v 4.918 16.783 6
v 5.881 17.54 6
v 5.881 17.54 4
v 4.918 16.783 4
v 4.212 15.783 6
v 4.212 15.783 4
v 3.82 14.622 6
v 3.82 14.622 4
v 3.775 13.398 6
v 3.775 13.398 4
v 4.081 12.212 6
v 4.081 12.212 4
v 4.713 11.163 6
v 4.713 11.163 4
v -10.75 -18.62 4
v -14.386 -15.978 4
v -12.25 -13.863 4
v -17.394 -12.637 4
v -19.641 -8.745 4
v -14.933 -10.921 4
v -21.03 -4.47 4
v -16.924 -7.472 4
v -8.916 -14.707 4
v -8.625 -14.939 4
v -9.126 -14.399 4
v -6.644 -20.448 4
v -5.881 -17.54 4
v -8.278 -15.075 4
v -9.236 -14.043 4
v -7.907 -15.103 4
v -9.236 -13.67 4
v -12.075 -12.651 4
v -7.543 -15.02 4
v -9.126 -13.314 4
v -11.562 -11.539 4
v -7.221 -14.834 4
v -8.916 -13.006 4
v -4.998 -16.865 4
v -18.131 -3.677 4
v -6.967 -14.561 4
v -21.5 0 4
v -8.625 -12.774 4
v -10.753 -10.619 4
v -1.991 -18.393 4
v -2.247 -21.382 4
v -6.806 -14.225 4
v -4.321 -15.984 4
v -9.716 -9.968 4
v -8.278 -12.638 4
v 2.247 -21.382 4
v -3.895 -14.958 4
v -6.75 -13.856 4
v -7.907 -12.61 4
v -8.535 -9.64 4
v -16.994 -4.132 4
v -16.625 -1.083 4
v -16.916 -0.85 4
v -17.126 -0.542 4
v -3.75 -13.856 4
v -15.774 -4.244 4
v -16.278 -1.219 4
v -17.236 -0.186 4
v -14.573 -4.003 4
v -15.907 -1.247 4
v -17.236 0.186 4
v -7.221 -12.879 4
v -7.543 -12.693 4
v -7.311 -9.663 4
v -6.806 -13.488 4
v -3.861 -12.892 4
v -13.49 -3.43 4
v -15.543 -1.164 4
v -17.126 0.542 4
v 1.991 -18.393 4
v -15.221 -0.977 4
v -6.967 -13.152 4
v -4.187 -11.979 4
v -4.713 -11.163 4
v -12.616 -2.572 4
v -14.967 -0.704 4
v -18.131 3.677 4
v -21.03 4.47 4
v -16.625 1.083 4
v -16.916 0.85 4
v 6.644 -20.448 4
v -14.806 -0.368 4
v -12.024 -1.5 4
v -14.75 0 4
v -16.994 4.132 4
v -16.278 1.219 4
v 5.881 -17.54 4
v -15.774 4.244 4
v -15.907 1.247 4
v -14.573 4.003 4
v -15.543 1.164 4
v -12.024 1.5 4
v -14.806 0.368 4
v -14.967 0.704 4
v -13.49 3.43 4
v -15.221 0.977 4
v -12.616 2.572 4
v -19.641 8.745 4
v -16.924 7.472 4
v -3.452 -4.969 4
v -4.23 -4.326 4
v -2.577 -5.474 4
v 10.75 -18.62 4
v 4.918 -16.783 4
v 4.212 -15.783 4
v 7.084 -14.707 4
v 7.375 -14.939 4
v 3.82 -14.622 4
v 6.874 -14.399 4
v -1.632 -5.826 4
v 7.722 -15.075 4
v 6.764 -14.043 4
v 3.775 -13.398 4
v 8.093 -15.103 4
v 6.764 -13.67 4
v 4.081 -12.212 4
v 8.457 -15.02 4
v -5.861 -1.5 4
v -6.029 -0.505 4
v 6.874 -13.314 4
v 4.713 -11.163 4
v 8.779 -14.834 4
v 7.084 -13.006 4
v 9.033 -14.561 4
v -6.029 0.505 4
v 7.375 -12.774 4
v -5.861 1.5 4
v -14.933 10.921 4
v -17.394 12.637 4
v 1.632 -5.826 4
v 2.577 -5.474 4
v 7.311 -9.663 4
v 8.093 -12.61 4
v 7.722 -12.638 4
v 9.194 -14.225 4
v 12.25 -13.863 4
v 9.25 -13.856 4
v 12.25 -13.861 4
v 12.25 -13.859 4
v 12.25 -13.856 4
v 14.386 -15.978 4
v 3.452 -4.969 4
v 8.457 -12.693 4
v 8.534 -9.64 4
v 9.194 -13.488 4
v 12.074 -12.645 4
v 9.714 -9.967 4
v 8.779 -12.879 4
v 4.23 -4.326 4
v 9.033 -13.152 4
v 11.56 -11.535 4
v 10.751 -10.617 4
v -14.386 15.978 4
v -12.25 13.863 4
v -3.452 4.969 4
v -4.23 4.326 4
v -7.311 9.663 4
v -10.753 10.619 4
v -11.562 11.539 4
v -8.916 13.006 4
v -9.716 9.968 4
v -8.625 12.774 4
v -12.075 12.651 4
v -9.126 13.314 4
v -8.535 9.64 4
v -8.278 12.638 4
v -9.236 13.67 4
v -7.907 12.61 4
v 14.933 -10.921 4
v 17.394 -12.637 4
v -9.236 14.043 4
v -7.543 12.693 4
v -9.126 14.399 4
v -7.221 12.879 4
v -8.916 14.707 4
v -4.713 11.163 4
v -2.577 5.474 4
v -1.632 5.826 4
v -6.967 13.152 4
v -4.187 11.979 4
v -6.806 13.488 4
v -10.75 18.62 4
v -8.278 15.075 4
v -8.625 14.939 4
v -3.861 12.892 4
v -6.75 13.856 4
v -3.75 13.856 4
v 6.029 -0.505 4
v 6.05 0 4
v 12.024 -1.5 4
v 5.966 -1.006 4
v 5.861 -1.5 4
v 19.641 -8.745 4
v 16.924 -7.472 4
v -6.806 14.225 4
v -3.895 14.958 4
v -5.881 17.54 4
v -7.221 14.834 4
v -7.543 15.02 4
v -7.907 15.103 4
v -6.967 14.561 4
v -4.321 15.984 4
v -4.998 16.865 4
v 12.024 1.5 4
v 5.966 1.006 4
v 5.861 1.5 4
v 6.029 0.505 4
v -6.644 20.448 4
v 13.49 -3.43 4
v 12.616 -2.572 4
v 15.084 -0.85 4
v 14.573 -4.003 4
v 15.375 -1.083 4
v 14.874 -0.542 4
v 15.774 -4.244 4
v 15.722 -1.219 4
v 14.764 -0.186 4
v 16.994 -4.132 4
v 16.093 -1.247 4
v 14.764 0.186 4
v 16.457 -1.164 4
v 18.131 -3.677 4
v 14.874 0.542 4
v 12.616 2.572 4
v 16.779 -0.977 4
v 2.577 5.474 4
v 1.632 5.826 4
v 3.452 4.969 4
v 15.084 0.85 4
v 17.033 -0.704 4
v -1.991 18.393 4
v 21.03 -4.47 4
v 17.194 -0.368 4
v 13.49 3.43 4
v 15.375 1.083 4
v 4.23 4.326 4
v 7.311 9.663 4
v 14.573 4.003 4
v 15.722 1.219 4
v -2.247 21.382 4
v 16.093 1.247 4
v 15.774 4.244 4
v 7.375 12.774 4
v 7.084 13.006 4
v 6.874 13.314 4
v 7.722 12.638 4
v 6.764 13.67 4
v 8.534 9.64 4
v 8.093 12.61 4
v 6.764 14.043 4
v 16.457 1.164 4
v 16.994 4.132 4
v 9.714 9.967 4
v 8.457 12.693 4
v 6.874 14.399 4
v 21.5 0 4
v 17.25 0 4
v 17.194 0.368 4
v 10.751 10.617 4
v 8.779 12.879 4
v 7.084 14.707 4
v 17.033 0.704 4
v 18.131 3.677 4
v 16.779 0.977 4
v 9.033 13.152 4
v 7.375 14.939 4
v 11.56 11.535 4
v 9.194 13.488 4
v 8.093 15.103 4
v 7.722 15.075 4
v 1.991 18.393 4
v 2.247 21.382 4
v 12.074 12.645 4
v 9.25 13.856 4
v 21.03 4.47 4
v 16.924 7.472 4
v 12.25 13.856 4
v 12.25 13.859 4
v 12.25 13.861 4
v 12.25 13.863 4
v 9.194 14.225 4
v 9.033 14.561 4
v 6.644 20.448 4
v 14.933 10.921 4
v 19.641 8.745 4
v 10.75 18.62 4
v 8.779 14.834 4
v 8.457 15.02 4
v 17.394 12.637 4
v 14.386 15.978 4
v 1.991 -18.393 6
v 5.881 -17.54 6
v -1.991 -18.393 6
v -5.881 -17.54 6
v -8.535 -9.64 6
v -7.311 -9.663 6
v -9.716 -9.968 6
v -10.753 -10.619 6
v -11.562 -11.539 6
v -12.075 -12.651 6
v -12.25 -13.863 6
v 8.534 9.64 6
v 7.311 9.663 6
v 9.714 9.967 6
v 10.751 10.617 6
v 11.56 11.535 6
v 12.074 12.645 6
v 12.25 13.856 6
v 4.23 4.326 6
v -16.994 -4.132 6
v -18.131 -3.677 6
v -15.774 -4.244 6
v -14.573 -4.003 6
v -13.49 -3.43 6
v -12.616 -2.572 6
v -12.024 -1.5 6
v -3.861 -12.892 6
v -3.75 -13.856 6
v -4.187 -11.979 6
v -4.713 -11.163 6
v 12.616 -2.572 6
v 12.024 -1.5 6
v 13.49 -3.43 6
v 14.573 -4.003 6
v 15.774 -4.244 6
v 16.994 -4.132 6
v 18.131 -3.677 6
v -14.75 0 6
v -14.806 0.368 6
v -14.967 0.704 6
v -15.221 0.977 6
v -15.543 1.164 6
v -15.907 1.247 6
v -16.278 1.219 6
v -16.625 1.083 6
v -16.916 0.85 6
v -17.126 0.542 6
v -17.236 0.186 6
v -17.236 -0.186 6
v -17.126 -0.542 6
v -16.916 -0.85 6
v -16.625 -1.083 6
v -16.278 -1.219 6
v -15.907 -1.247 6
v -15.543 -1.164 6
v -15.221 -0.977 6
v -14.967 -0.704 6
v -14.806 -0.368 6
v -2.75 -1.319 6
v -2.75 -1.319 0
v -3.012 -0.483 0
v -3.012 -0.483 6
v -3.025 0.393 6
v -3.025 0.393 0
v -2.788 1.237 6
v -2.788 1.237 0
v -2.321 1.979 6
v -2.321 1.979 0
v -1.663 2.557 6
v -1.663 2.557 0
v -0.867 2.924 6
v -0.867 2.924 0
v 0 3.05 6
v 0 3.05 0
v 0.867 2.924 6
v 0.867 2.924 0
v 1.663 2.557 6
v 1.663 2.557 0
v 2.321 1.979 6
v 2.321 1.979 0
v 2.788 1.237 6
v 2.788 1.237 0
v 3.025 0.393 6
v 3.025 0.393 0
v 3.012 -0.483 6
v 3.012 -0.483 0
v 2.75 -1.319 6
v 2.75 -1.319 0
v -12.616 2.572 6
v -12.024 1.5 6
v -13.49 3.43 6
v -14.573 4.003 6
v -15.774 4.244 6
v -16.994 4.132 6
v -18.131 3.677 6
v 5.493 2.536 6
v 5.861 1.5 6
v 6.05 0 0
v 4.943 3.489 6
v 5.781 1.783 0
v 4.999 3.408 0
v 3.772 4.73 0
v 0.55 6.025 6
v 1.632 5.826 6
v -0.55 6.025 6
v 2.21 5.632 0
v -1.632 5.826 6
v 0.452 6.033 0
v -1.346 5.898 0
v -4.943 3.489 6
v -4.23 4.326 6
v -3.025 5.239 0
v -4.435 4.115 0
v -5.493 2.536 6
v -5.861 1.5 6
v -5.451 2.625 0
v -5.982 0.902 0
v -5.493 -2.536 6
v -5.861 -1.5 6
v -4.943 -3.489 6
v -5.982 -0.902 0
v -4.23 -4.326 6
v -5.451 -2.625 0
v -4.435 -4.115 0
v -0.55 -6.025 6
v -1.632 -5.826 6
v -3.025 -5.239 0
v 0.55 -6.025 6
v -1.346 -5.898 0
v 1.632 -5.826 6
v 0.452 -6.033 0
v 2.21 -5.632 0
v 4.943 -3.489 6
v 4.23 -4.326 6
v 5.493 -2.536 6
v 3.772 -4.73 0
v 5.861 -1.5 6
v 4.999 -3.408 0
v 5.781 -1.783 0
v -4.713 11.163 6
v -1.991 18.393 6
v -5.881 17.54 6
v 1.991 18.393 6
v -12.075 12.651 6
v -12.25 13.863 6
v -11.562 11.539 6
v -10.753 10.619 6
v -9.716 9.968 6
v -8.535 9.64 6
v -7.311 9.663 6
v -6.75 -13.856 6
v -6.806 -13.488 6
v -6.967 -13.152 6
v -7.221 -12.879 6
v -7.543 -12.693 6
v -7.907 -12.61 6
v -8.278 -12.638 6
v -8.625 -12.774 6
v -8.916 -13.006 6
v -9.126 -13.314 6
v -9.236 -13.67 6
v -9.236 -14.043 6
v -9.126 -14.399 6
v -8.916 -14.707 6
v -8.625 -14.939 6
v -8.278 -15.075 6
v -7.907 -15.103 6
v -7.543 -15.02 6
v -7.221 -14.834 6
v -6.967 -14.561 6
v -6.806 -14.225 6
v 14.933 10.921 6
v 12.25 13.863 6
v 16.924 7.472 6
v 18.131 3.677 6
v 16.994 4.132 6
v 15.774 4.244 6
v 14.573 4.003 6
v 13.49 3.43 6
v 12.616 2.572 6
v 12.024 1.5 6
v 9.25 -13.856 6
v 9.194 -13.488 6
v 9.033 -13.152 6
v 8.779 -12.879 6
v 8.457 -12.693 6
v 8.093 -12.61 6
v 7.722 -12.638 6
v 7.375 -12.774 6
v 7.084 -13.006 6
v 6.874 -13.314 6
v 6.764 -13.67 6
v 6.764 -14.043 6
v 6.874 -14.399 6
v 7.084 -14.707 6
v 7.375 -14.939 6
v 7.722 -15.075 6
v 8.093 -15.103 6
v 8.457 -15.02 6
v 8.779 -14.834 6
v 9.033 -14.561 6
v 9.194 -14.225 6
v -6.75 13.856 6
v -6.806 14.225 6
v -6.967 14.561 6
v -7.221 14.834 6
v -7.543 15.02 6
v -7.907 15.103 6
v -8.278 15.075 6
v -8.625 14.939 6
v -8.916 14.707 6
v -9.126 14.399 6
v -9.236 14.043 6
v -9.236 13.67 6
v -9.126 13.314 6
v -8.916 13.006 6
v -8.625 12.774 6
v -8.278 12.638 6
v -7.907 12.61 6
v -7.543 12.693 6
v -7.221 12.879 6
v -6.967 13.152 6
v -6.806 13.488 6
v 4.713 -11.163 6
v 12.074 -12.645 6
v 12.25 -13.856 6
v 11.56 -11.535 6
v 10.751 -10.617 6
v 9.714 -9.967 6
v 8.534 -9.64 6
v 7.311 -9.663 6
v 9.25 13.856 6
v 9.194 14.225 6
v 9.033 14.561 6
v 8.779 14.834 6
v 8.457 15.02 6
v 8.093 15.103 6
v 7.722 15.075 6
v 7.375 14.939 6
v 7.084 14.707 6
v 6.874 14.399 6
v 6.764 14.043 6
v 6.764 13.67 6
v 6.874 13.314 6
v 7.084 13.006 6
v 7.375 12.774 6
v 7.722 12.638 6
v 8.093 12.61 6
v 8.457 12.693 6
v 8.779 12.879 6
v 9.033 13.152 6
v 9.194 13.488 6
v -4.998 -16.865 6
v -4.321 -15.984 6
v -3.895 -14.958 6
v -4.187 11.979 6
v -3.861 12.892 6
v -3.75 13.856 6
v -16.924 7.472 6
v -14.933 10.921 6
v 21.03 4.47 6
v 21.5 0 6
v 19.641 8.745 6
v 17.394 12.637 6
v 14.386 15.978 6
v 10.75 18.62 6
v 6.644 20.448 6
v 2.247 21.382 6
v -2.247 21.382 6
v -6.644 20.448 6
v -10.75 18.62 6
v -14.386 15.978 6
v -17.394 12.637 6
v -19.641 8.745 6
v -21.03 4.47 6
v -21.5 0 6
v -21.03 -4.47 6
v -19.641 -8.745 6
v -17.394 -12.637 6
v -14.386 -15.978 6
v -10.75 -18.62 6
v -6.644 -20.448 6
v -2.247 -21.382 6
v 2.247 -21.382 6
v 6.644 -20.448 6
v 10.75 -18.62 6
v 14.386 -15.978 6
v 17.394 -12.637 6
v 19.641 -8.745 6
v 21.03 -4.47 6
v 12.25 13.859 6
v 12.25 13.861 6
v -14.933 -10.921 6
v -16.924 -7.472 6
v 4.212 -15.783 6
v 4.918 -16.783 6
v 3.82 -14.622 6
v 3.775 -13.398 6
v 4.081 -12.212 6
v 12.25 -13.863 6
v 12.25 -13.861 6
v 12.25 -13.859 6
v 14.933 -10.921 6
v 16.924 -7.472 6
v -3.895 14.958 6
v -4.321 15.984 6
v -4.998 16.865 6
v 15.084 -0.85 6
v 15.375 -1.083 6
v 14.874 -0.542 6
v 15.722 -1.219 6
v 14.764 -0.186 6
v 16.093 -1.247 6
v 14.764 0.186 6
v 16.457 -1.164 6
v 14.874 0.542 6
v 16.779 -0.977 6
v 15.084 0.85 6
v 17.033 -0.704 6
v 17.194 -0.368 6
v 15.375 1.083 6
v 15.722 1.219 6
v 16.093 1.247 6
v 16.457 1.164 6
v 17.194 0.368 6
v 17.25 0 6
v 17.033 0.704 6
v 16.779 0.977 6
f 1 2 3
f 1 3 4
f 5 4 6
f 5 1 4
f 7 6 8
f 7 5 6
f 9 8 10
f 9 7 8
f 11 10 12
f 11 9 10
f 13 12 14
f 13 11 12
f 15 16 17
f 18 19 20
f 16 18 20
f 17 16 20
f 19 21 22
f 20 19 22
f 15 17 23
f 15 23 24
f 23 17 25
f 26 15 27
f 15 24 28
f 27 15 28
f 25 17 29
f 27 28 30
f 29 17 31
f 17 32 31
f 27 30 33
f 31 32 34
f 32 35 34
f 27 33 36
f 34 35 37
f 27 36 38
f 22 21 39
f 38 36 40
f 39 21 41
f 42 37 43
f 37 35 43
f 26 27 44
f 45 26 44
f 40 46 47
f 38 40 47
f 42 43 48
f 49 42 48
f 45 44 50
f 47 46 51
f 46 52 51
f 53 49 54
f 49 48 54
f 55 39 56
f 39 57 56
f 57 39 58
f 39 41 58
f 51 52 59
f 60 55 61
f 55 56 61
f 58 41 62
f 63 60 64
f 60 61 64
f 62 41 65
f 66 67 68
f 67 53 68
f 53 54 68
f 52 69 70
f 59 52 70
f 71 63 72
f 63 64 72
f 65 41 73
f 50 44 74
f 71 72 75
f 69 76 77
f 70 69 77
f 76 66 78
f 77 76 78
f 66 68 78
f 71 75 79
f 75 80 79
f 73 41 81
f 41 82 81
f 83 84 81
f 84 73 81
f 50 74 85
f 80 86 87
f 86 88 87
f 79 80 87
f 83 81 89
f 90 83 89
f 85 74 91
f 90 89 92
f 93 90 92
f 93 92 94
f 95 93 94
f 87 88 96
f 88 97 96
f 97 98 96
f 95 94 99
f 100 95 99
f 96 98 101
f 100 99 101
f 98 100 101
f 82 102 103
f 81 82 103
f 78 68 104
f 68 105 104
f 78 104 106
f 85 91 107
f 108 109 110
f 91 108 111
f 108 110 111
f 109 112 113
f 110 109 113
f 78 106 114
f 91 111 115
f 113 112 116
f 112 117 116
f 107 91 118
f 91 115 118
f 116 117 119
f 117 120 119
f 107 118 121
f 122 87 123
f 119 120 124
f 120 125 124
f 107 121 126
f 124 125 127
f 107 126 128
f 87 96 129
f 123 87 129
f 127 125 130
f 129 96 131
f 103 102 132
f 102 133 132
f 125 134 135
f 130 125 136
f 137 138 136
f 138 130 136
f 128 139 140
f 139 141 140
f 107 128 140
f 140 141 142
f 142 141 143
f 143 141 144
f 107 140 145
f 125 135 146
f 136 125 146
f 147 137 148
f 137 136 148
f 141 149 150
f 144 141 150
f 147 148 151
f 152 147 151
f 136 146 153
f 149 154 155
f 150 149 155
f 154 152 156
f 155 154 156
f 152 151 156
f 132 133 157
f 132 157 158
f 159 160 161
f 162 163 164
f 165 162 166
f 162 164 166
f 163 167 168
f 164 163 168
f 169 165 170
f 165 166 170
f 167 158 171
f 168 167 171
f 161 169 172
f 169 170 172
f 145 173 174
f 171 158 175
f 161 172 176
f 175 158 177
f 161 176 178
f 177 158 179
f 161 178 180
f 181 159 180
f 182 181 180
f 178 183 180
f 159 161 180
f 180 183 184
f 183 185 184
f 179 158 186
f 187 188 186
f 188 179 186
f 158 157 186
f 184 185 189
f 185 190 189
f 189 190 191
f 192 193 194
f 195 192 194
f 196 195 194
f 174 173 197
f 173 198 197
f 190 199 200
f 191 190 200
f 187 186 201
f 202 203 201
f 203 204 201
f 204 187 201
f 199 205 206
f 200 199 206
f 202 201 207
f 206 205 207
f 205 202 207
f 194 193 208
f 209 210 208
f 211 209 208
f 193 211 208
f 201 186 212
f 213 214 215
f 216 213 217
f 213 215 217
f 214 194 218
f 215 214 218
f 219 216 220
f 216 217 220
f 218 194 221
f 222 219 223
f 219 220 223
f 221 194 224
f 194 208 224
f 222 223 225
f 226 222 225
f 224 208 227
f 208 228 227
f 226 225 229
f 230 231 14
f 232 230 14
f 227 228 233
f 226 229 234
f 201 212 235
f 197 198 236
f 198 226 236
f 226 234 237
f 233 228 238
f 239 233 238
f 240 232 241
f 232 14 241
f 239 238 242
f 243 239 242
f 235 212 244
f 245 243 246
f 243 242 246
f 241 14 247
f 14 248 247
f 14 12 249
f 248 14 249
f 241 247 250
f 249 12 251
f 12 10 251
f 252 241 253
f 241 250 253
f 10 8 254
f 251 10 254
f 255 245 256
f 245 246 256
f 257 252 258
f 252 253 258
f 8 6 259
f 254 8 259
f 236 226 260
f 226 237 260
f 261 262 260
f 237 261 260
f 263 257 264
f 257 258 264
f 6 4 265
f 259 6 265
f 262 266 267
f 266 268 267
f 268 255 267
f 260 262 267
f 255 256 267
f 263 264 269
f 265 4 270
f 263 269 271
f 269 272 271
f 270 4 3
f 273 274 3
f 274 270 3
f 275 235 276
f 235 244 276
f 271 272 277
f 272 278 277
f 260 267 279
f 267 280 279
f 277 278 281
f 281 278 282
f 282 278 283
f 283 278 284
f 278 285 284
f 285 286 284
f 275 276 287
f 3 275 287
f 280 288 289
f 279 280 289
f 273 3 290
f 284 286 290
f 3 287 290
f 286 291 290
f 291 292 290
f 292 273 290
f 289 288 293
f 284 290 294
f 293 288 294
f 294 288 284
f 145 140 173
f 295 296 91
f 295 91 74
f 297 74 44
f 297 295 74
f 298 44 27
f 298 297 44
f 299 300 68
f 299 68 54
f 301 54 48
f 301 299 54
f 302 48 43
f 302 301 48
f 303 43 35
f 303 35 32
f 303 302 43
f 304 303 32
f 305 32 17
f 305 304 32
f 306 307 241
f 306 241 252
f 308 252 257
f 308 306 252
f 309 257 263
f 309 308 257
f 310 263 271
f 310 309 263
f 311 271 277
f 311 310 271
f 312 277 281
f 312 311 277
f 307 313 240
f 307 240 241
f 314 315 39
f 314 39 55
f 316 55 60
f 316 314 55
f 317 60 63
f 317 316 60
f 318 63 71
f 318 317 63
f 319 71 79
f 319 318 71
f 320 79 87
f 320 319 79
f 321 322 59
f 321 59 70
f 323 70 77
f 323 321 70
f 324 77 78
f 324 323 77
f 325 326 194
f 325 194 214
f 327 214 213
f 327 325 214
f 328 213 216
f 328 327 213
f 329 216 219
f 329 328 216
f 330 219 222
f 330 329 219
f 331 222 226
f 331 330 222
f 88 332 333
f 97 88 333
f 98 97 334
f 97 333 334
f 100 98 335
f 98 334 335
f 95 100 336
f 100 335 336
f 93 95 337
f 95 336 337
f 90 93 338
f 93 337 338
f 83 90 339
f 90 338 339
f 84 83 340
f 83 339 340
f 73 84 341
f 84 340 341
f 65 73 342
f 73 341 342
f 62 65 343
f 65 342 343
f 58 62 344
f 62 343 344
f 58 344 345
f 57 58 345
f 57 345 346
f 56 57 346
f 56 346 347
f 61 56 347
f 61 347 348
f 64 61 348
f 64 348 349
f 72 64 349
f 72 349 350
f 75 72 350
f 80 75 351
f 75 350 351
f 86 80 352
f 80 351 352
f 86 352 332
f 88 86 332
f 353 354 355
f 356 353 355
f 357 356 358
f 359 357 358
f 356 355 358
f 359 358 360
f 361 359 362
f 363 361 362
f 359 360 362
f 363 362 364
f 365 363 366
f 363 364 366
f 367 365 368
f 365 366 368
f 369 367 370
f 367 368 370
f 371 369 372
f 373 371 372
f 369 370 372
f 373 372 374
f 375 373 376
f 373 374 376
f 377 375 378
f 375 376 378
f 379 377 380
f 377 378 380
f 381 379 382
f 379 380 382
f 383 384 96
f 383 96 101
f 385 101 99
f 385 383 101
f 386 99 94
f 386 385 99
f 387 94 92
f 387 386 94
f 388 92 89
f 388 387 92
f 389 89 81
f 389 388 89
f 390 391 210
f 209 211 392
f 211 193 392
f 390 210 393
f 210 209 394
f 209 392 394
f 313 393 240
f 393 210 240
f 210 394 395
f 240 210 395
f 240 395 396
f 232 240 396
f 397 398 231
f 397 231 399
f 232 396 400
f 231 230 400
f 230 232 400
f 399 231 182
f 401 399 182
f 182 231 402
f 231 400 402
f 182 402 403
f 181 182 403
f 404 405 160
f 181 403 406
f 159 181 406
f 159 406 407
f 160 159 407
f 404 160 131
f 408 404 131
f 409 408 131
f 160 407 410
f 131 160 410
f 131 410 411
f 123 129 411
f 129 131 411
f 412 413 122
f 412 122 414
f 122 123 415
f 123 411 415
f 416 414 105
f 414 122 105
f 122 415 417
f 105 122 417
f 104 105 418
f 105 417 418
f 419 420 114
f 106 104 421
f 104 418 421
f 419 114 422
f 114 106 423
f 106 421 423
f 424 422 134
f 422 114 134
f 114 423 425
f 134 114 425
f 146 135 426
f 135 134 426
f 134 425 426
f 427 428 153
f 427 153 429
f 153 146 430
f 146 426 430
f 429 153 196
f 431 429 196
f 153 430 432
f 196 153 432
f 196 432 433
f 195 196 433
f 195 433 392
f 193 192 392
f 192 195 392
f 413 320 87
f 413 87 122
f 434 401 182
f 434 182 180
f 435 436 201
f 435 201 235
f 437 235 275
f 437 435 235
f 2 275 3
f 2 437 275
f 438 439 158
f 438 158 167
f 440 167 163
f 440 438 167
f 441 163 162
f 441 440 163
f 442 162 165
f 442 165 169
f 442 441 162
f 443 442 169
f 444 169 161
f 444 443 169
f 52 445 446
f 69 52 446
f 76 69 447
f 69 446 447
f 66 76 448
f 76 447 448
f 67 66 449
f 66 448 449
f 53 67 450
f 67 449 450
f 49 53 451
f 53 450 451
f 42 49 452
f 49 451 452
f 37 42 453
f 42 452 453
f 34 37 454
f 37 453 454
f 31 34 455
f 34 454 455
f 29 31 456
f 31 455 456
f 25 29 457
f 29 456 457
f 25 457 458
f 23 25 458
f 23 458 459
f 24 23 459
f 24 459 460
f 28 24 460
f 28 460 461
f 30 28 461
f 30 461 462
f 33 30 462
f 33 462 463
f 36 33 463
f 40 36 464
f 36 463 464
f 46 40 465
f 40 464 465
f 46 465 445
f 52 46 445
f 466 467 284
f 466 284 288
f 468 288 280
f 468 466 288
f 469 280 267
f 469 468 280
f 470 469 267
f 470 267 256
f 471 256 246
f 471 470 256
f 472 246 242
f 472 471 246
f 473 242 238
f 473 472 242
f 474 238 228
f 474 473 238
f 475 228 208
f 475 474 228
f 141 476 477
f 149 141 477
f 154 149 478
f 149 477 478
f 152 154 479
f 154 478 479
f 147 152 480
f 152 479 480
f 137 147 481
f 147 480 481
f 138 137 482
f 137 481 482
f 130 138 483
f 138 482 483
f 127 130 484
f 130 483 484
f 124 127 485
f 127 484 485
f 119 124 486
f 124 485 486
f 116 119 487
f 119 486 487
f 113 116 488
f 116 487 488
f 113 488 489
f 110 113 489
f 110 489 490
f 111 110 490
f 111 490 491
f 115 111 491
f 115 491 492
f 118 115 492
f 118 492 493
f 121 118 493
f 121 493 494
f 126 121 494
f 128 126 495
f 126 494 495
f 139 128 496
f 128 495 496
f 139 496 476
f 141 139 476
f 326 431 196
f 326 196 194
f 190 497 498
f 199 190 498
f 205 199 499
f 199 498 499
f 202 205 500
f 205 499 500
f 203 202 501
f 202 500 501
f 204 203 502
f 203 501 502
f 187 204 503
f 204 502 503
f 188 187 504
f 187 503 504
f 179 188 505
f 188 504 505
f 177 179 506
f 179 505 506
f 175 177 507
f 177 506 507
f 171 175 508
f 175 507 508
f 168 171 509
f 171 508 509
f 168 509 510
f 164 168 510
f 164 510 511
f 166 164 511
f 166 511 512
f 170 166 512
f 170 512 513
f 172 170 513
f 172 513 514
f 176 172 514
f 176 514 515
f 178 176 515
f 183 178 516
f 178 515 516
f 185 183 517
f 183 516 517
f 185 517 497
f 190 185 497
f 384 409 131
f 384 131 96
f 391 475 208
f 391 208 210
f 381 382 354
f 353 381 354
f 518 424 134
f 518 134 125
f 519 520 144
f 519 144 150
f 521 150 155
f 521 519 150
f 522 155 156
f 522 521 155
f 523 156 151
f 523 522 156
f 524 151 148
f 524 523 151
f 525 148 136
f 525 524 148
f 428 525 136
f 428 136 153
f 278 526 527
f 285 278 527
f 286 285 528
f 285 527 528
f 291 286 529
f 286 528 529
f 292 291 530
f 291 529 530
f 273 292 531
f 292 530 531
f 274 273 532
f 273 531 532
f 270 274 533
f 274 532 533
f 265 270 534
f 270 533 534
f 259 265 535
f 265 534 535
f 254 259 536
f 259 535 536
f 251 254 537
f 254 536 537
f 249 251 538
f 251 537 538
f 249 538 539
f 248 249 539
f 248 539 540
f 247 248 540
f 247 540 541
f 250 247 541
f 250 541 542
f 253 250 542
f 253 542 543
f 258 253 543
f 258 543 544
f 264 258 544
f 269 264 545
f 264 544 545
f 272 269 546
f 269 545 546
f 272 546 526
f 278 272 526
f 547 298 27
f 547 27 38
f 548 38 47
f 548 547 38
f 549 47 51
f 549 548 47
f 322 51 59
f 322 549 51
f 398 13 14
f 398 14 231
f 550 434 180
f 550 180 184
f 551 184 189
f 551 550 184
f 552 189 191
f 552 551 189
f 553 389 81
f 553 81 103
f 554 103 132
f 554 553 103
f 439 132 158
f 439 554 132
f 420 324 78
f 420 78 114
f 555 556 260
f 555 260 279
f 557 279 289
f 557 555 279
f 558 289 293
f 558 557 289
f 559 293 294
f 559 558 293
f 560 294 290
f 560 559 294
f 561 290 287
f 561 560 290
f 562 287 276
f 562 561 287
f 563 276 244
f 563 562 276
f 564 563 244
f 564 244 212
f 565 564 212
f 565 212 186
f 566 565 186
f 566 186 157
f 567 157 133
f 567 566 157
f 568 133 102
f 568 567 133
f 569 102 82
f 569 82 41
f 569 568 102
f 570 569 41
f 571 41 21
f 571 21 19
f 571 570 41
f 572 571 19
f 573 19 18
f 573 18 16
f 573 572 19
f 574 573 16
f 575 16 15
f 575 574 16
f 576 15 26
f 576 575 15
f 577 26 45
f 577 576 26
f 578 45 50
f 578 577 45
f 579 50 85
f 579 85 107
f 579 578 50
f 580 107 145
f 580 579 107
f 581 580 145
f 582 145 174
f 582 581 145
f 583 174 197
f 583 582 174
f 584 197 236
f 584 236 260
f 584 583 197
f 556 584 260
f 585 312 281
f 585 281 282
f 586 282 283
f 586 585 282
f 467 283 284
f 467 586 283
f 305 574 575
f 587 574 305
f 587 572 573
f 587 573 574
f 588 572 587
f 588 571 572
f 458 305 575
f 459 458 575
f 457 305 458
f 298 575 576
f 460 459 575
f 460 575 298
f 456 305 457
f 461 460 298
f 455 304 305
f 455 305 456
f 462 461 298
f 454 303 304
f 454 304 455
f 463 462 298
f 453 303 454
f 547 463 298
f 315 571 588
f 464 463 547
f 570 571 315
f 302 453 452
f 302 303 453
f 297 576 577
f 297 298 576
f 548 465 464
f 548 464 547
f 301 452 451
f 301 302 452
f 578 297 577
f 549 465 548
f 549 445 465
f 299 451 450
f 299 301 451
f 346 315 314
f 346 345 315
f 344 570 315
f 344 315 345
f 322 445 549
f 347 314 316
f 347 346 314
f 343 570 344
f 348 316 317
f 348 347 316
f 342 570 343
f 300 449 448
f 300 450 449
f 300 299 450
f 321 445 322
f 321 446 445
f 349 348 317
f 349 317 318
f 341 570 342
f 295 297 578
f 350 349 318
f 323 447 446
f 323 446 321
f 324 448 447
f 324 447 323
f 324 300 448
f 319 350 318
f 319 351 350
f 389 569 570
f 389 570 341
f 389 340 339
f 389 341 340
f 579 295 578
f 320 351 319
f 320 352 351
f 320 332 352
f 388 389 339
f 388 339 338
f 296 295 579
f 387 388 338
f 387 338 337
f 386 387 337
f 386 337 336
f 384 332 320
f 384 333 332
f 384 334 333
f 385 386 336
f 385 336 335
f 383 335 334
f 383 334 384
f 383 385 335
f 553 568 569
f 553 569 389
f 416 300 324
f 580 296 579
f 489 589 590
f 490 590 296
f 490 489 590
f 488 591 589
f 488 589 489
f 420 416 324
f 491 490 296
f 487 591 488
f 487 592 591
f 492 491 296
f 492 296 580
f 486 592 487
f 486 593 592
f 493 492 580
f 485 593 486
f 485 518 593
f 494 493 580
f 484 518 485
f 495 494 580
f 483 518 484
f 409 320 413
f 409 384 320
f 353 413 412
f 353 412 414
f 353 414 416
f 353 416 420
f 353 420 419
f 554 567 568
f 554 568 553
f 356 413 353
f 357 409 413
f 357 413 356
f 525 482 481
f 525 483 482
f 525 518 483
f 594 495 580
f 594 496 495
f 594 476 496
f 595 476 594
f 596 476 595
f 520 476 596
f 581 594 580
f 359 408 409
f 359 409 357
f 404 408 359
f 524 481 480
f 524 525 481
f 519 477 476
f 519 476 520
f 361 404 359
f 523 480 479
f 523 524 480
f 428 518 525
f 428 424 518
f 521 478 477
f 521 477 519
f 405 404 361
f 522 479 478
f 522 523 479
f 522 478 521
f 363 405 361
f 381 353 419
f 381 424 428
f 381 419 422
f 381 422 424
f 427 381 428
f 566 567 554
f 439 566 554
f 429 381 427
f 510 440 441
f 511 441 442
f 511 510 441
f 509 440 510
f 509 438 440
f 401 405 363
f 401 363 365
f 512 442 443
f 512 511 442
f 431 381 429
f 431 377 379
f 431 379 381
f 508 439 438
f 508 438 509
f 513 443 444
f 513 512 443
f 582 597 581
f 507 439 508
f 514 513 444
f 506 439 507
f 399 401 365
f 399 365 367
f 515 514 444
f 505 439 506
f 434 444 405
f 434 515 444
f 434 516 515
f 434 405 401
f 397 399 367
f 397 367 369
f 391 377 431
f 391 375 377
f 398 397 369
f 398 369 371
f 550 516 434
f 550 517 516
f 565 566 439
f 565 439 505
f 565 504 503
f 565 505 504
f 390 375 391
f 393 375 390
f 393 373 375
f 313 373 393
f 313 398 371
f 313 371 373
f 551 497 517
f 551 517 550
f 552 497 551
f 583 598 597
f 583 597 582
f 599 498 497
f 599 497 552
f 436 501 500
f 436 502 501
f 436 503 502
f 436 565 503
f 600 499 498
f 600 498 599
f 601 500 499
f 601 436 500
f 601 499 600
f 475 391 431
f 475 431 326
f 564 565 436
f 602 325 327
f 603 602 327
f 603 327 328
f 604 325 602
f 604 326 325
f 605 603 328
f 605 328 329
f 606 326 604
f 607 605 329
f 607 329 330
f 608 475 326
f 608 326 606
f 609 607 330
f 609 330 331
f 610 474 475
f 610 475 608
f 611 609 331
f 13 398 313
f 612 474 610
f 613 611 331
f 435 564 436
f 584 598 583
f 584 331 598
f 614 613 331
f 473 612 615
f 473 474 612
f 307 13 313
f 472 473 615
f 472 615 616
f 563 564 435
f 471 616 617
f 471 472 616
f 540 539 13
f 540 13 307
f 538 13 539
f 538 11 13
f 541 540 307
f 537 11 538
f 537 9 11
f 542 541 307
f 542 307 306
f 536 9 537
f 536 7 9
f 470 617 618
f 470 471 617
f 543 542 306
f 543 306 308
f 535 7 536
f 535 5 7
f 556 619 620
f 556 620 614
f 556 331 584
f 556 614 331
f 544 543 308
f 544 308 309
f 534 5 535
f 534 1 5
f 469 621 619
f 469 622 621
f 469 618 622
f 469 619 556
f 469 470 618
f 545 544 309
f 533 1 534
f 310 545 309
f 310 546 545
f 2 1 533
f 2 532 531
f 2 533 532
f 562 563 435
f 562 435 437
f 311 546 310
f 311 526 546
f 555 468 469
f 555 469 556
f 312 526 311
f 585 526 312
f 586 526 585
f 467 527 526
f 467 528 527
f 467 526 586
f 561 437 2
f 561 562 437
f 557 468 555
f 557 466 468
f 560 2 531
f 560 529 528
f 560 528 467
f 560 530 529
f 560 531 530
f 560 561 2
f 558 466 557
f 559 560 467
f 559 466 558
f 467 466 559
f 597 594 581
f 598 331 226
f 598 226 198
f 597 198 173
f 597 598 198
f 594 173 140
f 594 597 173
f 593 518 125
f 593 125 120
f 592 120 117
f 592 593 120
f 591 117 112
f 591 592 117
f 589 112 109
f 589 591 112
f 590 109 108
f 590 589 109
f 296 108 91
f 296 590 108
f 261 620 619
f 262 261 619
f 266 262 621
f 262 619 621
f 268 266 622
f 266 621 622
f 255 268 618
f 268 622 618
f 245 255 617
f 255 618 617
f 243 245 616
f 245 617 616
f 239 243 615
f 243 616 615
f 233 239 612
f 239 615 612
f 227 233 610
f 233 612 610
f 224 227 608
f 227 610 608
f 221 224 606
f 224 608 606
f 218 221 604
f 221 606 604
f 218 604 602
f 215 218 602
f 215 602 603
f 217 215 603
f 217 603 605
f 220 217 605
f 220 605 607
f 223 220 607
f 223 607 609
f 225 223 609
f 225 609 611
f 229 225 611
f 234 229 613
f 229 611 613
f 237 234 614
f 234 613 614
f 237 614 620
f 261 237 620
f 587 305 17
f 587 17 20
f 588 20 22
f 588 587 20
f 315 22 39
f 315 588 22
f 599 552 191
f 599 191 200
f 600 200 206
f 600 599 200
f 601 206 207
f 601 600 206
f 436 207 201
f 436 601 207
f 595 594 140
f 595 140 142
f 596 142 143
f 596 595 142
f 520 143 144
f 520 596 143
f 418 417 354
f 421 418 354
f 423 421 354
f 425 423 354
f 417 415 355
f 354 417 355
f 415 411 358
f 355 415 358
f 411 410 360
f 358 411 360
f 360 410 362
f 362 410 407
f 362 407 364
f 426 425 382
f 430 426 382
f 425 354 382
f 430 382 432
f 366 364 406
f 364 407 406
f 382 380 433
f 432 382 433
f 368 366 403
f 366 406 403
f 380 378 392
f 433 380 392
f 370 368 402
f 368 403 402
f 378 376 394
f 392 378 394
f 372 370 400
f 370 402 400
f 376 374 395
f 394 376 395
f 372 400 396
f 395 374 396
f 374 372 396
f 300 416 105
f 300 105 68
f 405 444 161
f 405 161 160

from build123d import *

# Parameters (mm, degrees)
F0_R     = 6.05
F1_DEPTH = 6
F2_R     = 21.5
F2_R_2   = 1.25
F3_DEPTH = 2


with BuildPart() as f1:
    # F0 (on Top) → F1 (new body)
    with BuildSketch(Plane.XY):
        Circle(F0_R)
        with BuildLine():
            Line((2.75, -1.3190905958), (-2.75, -1.3190905958))
            ThreePointArc((-2.75, -1.3190905958), (0, 3.05), (2.75, -1.3190905958))
        make_face(mode=Mode.SUBTRACT)
    extrude(amount=F1_DEPTH)

    # F2 (on face) → F3 (join)
    with BuildSketch(Plane.XY.offset(6)):
        Circle(F2_R)
        with BuildLine():
            ThreePointArc((12.2499946096, 13.8631753962), (16.02146997, 9.25), (18.130859375, 3.67721883))
            ThreePointArc((18.130859375, 3.67721883), (19.6822990335, 2.1220682902), (20.25, 0))
            ThreePointArc((20.25, 0), (19.6822990335, -2.1220682902), (18.130859375, -3.67721883))
            ThreePointArc((18.130859375, -3.67721883), (16.02146997, -9.25), (12.2499946096, -13.8631753962))
            ThreePointArc((12.2499946096, -13.8631753962), (10.125, -17.5370144266), (5.8808647654, -17.5403942262))
            ThreePointArc((5.8808647654, -17.5403942262), (0, -18.5), (-5.8808647654, -17.5403942262))
            ThreePointArc((-5.8808647654, -17.5403942262), (-10.125, -17.5370144266), (-12.2499946096, -13.8631753962))
            ThreePointArc((-12.2499946096, -13.8631753962), (-16.02146997, -9.25), (-18.130859375, -3.67721883))
            ThreePointArc((-18.130859375, -3.67721883), (-20.25, 0), (-18.130859375, 3.67721883))
            ThreePointArc((-18.130859375, 3.67721883), (-16.02146997, 9.25), (-12.2499946096, 13.8631753962))
            ThreePointArc((-12.2499946096, 13.8631753962), (-10.125, 17.5370144266), (-5.8808647654, 17.5403942262))
            ThreePointArc((-5.8808647654, 17.5403942262), (0, 18.5), (5.8808647654, 17.5403942262))
            ThreePointArc((5.8808647654, 17.5403942262), (10.125, 17.5370144266), (12.2499946096, 13.8631753962))
        make_face(mode=Mode.SUBTRACT)
        with BuildLine():
            ThreePointArc((-12.0235065699, 1.5), (-14.5728834228, 4.0032284815), (-18.130859375, 3.67721883))
            ThreePointArc((-18.130859375, 3.67721883), (-18.5, 0), (-18.130859375, -3.67721883))
            ThreePointArc((-18.130859375, -3.67721883), (-14.5728834228, -4.0032284815), (-12.0235065699, -1.5))
            Line((-12.0235065699, -1.5), (-14, -1.5))
            Line((-14, -1.5), (-14, 1.5))
            Line((-14, 1.5), (-12.0235065699, 1.5))
        make_face()
        with Locations((-16, 0)):
            Circle(F2_R_2, mode=Mode.SUBTRACT)
        with BuildLine():
            ThreePointArc((-3.75, 13.8564064606), (-4.3210854354, 15.9843368228), (-5.8808647654, 17.5403942262))
            ThreePointArc((-5.8808647654, 17.5403942262), (-9.25, 16.02146997), (-12.2499946096, 13.8631753962))
            ThreePointArc((-12.2499946096, 13.8631753962), (-10.7533392736, 10.6188730098), (-7.3107913906, 9.6626621321))
            Line((-7.3107913906, 9.6626621321), (-8.2990381057, 11.374355653))
            Line((-8.2990381057, 11.374355653), (-5.7009618943, 12.874355653))
            Line((-5.7009618943, 12.874355653), (-4.7127151792, 11.1626621321))
            ThreePointArc((-4.7127151792, 11.1626621321), (-3.9979092659, 12.4261023824), (-3.75, 13.8564064606))
        make_face()
        with Locations((-8, 13.8564064606)):
            Circle(F2_R_2, mode=Mode.SUBTRACT)
        with BuildLine():
            ThreePointArc((12.25, 13.8564064606), (12.2499986524, 13.8597909294), (12.2499946096, 13.8631753962))
            ThreePointArc((12.2499946096, 13.8631753962), (9.25, 16.02146997), (5.8808647654, 17.5403942262))
            ThreePointArc((5.8808647654, 17.5403942262), (3.8195441493, 14.6221014913), (4.7127151792, 11.1626621321))
            Line((4.7127151792, 11.1626621321), (5.7009618943, 12.874355653))
            Line((5.7009618943, 12.874355653), (8.2990381057, 11.374355653))
            Line((8.2990381057, 11.374355653), (7.3107913906, 9.6626621321))
            ThreePointArc((7.3107913906, 9.6626621321), (10.7507602049, 10.6166814267), (12.25, 13.8564064606))
        make_face()
        with Locations((8, 13.8564064606)):
            Circle(F2_R_2, mode=Mode.SUBTRACT)
        with BuildLine():
            ThreePointArc((18.130859375, -3.67721883), (18.4074835113, -1.8478503135), (18.5, 0))
            ThreePointArc((18.5, 0), (18.4074835113, 1.8478503135), (18.130859375, 3.67721883))
            ThreePointArc((18.130859375, 3.67721883), (14.5728834228, 4.0032284815), (12.0235065699, 1.5))
            Line((12.0235065699, 1.5), (14, 1.5))
            Line((14, 1.5), (14, -1.5))
            Line((14, -1.5), (12.0235065699, -1.5))
            ThreePointArc((12.0235065699, -1.5), (14.5728834228, -4.0032284815), (18.130859375, -3.67721883))
        make_face()
        with Locations((16, 0)):
            Circle(F2_R_2, mode=Mode.SUBTRACT)
        with BuildLine():
            ThreePointArc((5.8808647654, -17.5403942262), (9.25, -16.02146997), (12.2499946096, -13.8631753962))
            ThreePointArc((12.2499946096, -13.8631753962), (12.2499986524, -13.8597909294), (12.25, -13.8564064606))
            ThreePointArc((12.25, -13.8564064606), (10.7507602049, -10.6166814267), (7.3107913906, -9.6626621321))
            Line((7.3107913906, -9.6626621321), (8.2990381057, -11.374355653))
            Line((8.2990381057, -11.374355653), (5.7009618943, -12.874355653))
            Line((5.7009618943, -12.874355653), (4.7127151792, -11.1626621321))
            ThreePointArc((4.7127151792, -11.1626621321), (3.8195441493, -14.6221014913), (5.8808647654, -17.5403942262))
        make_face()
        with Locations((8, -13.8564064606)):
            Circle(F2_R_2, mode=Mode.SUBTRACT)
        with BuildLine():
            ThreePointArc((-12.2499946096, -13.8631753962), (-9.25, -16.02146997), (-5.8808647654, -17.5403942262))
            ThreePointArc((-5.8808647654, -17.5403942262), (-4.3210854354, -15.9843368228), (-3.75, -13.8564064606))
            ThreePointArc((-3.75, -13.8564064606), (-3.9979092659, -12.4261023824), (-4.7127151792, -11.1626621321))
            Line((-4.7127151792, -11.1626621321), (-5.7009618943, -12.874355653))
            Line((-5.7009618943, -12.874355653), (-8.2990381057, -11.374355653))
            Line((-8.2990381057, -11.374355653), (-7.3107913906, -9.6626621321))
            ThreePointArc((-7.3107913906, -9.6626621321), (-10.7533392736, -10.6188730098), (-12.2499946096, -13.8631753962))
        make_face()
        with Locations((-8, -13.8564064606)):
            Circle(F2_R_2, mode=Mode.SUBTRACT)
        with BuildLine():
            ThreePointArc((-12.2499946096, 13.8631753962), (-9.25, 16.02146997), (-5.8808647654, 17.5403942262))
            ThreePointArc((-5.8808647654, 17.5403942262), (-10.125, 17.5370144266), (-12.2499946096, 13.8631753962))
        make_face()
        with BuildLine():
            ThreePointArc((-18.130859375, -3.67721883), (-18.5, 0), (-18.130859375, 3.67721883))
            ThreePointArc((-18.130859375, 3.67721883), (-20.25, 0), (-18.130859375, -3.67721883))
        make_face()
        with BuildLine():
            ThreePointArc((-12.2499946096, -13.8631753962), (-10.125, -17.5370144266), (-5.8808647654, -17.5403942262))
            ThreePointArc((-5.8808647654, -17.5403942262), (-9.25, -16.02146997), (-12.2499946096, -13.8631753962))
        make_face()
        with BuildLine():
            ThreePointArc((5.8808647654, -17.5403942262), (10.125, -17.5370144266), (12.2499946096, -13.8631753962))
            ThreePointArc((12.2499946096, -13.8631753962), (9.25, -16.02146997), (5.8808647654, -17.5403942262))
        make_face()
        with BuildLine():
            ThreePointArc((18.130859375, 3.67721883), (18.4074835113, 1.8478503135), (18.5, 0))
            ThreePointArc((18.5, 0), (18.4074835113, -1.8478503135), (18.130859375, -3.67721883))
            ThreePointArc((18.130859375, -3.67721883), (19.6822990335, -2.1220682902), (20.25, 0))
            ThreePointArc((20.25, 0), (19.6822990335, 2.1220682902), (18.130859375, 3.67721883))
        make_face()
        with BuildLine():
            ThreePointArc((5.8808647654, 17.5403942262), (9.25, 16.02146997), (12.2499946096, 13.8631753962))
            ThreePointArc((12.2499946096, 13.8631753962), (10.125, 17.5370144266), (5.8808647654, 17.5403942262))
        make_face()
        with BuildLine():
            ThreePointArc((-4.7127151792, 11.1626621321), (-5.875, 10.1757984945), (-7.3107913906, 9.6626621321))
            Line((-7.3107913906, 9.6626621321), (-4.2295883953, 4.3258619958))
            ThreePointArc((-4.2295883953, 4.3258619958), (-3.025, 5.2394536929), (-1.6315121839, 5.8258619958))
            Line((-1.6315121839, 5.8258619958), (-4.7127151792, 11.1626621321))
        make_face()
        with BuildLine():
            Line((-8.2990381057, 11.374355653), (-7.3107913906, 9.6626621321))
            ThreePointArc((-7.3107913906, 9.6626621321), (-5.875, 10.1757984945), (-4.7127151792, 11.1626621321))
            Line((-4.7127151792, 11.1626621321), (-5.7009618943, 12.874355653))
            Line((-5.7009618943, 12.874355653), (-8.2990381057, 11.374355653))
        make_face()
        with BuildLine():
            Line((5.7009618943, 12.874355653), (4.7127151792, 11.1626621321))
            ThreePointArc((4.7127151792, 11.1626621321), (5.875, 10.1757984945), (7.3107913906, 9.6626621321))
            Line((7.3107913906, 9.6626621321), (8.2990381057, 11.374355653))
            Line((8.2990381057, 11.374355653), (5.7009618943, 12.874355653))
        make_face()
        with BuildLine():
            ThreePointArc((7.3107913906, 9.6626621321), (5.875, 10.1757984945), (4.7127151792, 11.1626621321))
            Line((4.7127151792, 11.1626621321), (1.6315121839, 5.8258619958))
            ThreePointArc((1.6315121839, 5.8258619958), (3.025, 5.2394536929), (4.2295883953, 4.3258619958))
            Line((4.2295883953, 4.3258619958), (7.3107913906, 9.6626621321))
        make_face()
        with BuildLine():
            ThreePointArc((12.0235065699, -1.5), (11.75, 0), (12.0235065699, 1.5))
            Line((12.0235065699, 1.5), (5.8611005792, 1.5))
            ThreePointArc((5.8611005792, 1.5), (6.0025893789, 0.7559237712), (6.05, 0))
            ThreePointArc((6.05, 0), (6.0025893789, -0.7559237712), (5.8611005792, -1.5))
            Line((5.8611005792, -1.5), (12.0235065699, -1.5))
        make_face()
        with BuildLine():
            Line((14, 1.5), (12.0235065699, 1.5))
            ThreePointArc((12.0235065699, 1.5), (11.75, 0), (12.0235065699, -1.5))
            Line((12.0235065699, -1.5), (14, -1.5))
            Line((14, -1.5), (14, 1.5))
        make_face()
        with BuildLine():
            Line((1.6315121839, -5.8258619958), (4.7127151792, -11.1626621321))
            ThreePointArc((4.7127151792, -11.1626621321), (5.875, -10.1757984945), (7.3107913906, -9.6626621321))
            Line((7.3107913906, -9.6626621321), (4.2295883953, -4.3258619958))
            ThreePointArc((4.2295883953, -4.3258619958), (3.025, -5.2394536929), (1.6315121839, -5.8258619958))
        make_face()
        with BuildLine():
            ThreePointArc((7.3107913906, -9.6626621321), (5.875, -10.1757984945), (4.7127151792, -11.1626621321))
            Line((4.7127151792, -11.1626621321), (5.7009618943, -12.874355653))
            Line((5.7009618943, -12.874355653), (8.2990381057, -11.374355653))
            Line((8.2990381057, -11.374355653), (7.3107913906, -9.6626621321))
        make_face()
        with BuildLine():
            Line((-4.2295883953, -4.3258619958), (-7.3107913906, -9.6626621321))
            ThreePointArc((-7.3107913906, -9.6626621321), (-5.875, -10.1757984945), (-4.7127151792, -11.1626621321))
            Line((-4.7127151792, -11.1626621321), (-1.6315121839, -5.8258619958))
            ThreePointArc((-1.6315121839, -5.8258619958), (-3.025, -5.2394536929), (-4.2295883953, -4.3258619958))
        make_face()
        with BuildLine():
            ThreePointArc((-4.7127151792, -11.1626621321), (-5.875, -10.1757984945), (-7.3107913906, -9.6626621321))
            Line((-7.3107913906, -9.6626621321), (-8.2990381057, -11.374355653))
            Line((-8.2990381057, -11.374355653), (-5.7009618943, -12.874355653))
            Line((-5.7009618943, -12.874355653), (-4.7127151792, -11.1626621321))
        make_face()
        with BuildLine():
            Line((-5.8611005792, 1.5), (-12.0235065699, 1.5))
            ThreePointArc((-12.0235065699, 1.5), (-11.8189357169, 0.7623657003), (-11.75, 0))
            ThreePointArc((-11.75, 0), (-11.8189357169, -0.7623657003), (-12.0235065699, -1.5))
            Line((-12.0235065699, -1.5), (-5.8611005792, -1.5))
            ThreePointArc((-5.8611005792, -1.5), (-6.05, 0), (-5.8611005792, 1.5))
        make_face()
        with BuildLine():
            ThreePointArc((-11.75, 0), (-11.8189357169, 0.7623657003), (-12.0235065699, 1.5))
            Line((-12.0235065699, 1.5), (-14, 1.5))
            Line((-14, 1.5), (-14, -1.5))
            Line((-14, -1.5), (-12.0235065699, -1.5))
            ThreePointArc((-12.0235065699, -1.5), (-11.8189357169, -0.7623657003), (-11.75, 0))
        make_face()
    extrude(amount=-F3_DEPTH)


solid = f1.part
